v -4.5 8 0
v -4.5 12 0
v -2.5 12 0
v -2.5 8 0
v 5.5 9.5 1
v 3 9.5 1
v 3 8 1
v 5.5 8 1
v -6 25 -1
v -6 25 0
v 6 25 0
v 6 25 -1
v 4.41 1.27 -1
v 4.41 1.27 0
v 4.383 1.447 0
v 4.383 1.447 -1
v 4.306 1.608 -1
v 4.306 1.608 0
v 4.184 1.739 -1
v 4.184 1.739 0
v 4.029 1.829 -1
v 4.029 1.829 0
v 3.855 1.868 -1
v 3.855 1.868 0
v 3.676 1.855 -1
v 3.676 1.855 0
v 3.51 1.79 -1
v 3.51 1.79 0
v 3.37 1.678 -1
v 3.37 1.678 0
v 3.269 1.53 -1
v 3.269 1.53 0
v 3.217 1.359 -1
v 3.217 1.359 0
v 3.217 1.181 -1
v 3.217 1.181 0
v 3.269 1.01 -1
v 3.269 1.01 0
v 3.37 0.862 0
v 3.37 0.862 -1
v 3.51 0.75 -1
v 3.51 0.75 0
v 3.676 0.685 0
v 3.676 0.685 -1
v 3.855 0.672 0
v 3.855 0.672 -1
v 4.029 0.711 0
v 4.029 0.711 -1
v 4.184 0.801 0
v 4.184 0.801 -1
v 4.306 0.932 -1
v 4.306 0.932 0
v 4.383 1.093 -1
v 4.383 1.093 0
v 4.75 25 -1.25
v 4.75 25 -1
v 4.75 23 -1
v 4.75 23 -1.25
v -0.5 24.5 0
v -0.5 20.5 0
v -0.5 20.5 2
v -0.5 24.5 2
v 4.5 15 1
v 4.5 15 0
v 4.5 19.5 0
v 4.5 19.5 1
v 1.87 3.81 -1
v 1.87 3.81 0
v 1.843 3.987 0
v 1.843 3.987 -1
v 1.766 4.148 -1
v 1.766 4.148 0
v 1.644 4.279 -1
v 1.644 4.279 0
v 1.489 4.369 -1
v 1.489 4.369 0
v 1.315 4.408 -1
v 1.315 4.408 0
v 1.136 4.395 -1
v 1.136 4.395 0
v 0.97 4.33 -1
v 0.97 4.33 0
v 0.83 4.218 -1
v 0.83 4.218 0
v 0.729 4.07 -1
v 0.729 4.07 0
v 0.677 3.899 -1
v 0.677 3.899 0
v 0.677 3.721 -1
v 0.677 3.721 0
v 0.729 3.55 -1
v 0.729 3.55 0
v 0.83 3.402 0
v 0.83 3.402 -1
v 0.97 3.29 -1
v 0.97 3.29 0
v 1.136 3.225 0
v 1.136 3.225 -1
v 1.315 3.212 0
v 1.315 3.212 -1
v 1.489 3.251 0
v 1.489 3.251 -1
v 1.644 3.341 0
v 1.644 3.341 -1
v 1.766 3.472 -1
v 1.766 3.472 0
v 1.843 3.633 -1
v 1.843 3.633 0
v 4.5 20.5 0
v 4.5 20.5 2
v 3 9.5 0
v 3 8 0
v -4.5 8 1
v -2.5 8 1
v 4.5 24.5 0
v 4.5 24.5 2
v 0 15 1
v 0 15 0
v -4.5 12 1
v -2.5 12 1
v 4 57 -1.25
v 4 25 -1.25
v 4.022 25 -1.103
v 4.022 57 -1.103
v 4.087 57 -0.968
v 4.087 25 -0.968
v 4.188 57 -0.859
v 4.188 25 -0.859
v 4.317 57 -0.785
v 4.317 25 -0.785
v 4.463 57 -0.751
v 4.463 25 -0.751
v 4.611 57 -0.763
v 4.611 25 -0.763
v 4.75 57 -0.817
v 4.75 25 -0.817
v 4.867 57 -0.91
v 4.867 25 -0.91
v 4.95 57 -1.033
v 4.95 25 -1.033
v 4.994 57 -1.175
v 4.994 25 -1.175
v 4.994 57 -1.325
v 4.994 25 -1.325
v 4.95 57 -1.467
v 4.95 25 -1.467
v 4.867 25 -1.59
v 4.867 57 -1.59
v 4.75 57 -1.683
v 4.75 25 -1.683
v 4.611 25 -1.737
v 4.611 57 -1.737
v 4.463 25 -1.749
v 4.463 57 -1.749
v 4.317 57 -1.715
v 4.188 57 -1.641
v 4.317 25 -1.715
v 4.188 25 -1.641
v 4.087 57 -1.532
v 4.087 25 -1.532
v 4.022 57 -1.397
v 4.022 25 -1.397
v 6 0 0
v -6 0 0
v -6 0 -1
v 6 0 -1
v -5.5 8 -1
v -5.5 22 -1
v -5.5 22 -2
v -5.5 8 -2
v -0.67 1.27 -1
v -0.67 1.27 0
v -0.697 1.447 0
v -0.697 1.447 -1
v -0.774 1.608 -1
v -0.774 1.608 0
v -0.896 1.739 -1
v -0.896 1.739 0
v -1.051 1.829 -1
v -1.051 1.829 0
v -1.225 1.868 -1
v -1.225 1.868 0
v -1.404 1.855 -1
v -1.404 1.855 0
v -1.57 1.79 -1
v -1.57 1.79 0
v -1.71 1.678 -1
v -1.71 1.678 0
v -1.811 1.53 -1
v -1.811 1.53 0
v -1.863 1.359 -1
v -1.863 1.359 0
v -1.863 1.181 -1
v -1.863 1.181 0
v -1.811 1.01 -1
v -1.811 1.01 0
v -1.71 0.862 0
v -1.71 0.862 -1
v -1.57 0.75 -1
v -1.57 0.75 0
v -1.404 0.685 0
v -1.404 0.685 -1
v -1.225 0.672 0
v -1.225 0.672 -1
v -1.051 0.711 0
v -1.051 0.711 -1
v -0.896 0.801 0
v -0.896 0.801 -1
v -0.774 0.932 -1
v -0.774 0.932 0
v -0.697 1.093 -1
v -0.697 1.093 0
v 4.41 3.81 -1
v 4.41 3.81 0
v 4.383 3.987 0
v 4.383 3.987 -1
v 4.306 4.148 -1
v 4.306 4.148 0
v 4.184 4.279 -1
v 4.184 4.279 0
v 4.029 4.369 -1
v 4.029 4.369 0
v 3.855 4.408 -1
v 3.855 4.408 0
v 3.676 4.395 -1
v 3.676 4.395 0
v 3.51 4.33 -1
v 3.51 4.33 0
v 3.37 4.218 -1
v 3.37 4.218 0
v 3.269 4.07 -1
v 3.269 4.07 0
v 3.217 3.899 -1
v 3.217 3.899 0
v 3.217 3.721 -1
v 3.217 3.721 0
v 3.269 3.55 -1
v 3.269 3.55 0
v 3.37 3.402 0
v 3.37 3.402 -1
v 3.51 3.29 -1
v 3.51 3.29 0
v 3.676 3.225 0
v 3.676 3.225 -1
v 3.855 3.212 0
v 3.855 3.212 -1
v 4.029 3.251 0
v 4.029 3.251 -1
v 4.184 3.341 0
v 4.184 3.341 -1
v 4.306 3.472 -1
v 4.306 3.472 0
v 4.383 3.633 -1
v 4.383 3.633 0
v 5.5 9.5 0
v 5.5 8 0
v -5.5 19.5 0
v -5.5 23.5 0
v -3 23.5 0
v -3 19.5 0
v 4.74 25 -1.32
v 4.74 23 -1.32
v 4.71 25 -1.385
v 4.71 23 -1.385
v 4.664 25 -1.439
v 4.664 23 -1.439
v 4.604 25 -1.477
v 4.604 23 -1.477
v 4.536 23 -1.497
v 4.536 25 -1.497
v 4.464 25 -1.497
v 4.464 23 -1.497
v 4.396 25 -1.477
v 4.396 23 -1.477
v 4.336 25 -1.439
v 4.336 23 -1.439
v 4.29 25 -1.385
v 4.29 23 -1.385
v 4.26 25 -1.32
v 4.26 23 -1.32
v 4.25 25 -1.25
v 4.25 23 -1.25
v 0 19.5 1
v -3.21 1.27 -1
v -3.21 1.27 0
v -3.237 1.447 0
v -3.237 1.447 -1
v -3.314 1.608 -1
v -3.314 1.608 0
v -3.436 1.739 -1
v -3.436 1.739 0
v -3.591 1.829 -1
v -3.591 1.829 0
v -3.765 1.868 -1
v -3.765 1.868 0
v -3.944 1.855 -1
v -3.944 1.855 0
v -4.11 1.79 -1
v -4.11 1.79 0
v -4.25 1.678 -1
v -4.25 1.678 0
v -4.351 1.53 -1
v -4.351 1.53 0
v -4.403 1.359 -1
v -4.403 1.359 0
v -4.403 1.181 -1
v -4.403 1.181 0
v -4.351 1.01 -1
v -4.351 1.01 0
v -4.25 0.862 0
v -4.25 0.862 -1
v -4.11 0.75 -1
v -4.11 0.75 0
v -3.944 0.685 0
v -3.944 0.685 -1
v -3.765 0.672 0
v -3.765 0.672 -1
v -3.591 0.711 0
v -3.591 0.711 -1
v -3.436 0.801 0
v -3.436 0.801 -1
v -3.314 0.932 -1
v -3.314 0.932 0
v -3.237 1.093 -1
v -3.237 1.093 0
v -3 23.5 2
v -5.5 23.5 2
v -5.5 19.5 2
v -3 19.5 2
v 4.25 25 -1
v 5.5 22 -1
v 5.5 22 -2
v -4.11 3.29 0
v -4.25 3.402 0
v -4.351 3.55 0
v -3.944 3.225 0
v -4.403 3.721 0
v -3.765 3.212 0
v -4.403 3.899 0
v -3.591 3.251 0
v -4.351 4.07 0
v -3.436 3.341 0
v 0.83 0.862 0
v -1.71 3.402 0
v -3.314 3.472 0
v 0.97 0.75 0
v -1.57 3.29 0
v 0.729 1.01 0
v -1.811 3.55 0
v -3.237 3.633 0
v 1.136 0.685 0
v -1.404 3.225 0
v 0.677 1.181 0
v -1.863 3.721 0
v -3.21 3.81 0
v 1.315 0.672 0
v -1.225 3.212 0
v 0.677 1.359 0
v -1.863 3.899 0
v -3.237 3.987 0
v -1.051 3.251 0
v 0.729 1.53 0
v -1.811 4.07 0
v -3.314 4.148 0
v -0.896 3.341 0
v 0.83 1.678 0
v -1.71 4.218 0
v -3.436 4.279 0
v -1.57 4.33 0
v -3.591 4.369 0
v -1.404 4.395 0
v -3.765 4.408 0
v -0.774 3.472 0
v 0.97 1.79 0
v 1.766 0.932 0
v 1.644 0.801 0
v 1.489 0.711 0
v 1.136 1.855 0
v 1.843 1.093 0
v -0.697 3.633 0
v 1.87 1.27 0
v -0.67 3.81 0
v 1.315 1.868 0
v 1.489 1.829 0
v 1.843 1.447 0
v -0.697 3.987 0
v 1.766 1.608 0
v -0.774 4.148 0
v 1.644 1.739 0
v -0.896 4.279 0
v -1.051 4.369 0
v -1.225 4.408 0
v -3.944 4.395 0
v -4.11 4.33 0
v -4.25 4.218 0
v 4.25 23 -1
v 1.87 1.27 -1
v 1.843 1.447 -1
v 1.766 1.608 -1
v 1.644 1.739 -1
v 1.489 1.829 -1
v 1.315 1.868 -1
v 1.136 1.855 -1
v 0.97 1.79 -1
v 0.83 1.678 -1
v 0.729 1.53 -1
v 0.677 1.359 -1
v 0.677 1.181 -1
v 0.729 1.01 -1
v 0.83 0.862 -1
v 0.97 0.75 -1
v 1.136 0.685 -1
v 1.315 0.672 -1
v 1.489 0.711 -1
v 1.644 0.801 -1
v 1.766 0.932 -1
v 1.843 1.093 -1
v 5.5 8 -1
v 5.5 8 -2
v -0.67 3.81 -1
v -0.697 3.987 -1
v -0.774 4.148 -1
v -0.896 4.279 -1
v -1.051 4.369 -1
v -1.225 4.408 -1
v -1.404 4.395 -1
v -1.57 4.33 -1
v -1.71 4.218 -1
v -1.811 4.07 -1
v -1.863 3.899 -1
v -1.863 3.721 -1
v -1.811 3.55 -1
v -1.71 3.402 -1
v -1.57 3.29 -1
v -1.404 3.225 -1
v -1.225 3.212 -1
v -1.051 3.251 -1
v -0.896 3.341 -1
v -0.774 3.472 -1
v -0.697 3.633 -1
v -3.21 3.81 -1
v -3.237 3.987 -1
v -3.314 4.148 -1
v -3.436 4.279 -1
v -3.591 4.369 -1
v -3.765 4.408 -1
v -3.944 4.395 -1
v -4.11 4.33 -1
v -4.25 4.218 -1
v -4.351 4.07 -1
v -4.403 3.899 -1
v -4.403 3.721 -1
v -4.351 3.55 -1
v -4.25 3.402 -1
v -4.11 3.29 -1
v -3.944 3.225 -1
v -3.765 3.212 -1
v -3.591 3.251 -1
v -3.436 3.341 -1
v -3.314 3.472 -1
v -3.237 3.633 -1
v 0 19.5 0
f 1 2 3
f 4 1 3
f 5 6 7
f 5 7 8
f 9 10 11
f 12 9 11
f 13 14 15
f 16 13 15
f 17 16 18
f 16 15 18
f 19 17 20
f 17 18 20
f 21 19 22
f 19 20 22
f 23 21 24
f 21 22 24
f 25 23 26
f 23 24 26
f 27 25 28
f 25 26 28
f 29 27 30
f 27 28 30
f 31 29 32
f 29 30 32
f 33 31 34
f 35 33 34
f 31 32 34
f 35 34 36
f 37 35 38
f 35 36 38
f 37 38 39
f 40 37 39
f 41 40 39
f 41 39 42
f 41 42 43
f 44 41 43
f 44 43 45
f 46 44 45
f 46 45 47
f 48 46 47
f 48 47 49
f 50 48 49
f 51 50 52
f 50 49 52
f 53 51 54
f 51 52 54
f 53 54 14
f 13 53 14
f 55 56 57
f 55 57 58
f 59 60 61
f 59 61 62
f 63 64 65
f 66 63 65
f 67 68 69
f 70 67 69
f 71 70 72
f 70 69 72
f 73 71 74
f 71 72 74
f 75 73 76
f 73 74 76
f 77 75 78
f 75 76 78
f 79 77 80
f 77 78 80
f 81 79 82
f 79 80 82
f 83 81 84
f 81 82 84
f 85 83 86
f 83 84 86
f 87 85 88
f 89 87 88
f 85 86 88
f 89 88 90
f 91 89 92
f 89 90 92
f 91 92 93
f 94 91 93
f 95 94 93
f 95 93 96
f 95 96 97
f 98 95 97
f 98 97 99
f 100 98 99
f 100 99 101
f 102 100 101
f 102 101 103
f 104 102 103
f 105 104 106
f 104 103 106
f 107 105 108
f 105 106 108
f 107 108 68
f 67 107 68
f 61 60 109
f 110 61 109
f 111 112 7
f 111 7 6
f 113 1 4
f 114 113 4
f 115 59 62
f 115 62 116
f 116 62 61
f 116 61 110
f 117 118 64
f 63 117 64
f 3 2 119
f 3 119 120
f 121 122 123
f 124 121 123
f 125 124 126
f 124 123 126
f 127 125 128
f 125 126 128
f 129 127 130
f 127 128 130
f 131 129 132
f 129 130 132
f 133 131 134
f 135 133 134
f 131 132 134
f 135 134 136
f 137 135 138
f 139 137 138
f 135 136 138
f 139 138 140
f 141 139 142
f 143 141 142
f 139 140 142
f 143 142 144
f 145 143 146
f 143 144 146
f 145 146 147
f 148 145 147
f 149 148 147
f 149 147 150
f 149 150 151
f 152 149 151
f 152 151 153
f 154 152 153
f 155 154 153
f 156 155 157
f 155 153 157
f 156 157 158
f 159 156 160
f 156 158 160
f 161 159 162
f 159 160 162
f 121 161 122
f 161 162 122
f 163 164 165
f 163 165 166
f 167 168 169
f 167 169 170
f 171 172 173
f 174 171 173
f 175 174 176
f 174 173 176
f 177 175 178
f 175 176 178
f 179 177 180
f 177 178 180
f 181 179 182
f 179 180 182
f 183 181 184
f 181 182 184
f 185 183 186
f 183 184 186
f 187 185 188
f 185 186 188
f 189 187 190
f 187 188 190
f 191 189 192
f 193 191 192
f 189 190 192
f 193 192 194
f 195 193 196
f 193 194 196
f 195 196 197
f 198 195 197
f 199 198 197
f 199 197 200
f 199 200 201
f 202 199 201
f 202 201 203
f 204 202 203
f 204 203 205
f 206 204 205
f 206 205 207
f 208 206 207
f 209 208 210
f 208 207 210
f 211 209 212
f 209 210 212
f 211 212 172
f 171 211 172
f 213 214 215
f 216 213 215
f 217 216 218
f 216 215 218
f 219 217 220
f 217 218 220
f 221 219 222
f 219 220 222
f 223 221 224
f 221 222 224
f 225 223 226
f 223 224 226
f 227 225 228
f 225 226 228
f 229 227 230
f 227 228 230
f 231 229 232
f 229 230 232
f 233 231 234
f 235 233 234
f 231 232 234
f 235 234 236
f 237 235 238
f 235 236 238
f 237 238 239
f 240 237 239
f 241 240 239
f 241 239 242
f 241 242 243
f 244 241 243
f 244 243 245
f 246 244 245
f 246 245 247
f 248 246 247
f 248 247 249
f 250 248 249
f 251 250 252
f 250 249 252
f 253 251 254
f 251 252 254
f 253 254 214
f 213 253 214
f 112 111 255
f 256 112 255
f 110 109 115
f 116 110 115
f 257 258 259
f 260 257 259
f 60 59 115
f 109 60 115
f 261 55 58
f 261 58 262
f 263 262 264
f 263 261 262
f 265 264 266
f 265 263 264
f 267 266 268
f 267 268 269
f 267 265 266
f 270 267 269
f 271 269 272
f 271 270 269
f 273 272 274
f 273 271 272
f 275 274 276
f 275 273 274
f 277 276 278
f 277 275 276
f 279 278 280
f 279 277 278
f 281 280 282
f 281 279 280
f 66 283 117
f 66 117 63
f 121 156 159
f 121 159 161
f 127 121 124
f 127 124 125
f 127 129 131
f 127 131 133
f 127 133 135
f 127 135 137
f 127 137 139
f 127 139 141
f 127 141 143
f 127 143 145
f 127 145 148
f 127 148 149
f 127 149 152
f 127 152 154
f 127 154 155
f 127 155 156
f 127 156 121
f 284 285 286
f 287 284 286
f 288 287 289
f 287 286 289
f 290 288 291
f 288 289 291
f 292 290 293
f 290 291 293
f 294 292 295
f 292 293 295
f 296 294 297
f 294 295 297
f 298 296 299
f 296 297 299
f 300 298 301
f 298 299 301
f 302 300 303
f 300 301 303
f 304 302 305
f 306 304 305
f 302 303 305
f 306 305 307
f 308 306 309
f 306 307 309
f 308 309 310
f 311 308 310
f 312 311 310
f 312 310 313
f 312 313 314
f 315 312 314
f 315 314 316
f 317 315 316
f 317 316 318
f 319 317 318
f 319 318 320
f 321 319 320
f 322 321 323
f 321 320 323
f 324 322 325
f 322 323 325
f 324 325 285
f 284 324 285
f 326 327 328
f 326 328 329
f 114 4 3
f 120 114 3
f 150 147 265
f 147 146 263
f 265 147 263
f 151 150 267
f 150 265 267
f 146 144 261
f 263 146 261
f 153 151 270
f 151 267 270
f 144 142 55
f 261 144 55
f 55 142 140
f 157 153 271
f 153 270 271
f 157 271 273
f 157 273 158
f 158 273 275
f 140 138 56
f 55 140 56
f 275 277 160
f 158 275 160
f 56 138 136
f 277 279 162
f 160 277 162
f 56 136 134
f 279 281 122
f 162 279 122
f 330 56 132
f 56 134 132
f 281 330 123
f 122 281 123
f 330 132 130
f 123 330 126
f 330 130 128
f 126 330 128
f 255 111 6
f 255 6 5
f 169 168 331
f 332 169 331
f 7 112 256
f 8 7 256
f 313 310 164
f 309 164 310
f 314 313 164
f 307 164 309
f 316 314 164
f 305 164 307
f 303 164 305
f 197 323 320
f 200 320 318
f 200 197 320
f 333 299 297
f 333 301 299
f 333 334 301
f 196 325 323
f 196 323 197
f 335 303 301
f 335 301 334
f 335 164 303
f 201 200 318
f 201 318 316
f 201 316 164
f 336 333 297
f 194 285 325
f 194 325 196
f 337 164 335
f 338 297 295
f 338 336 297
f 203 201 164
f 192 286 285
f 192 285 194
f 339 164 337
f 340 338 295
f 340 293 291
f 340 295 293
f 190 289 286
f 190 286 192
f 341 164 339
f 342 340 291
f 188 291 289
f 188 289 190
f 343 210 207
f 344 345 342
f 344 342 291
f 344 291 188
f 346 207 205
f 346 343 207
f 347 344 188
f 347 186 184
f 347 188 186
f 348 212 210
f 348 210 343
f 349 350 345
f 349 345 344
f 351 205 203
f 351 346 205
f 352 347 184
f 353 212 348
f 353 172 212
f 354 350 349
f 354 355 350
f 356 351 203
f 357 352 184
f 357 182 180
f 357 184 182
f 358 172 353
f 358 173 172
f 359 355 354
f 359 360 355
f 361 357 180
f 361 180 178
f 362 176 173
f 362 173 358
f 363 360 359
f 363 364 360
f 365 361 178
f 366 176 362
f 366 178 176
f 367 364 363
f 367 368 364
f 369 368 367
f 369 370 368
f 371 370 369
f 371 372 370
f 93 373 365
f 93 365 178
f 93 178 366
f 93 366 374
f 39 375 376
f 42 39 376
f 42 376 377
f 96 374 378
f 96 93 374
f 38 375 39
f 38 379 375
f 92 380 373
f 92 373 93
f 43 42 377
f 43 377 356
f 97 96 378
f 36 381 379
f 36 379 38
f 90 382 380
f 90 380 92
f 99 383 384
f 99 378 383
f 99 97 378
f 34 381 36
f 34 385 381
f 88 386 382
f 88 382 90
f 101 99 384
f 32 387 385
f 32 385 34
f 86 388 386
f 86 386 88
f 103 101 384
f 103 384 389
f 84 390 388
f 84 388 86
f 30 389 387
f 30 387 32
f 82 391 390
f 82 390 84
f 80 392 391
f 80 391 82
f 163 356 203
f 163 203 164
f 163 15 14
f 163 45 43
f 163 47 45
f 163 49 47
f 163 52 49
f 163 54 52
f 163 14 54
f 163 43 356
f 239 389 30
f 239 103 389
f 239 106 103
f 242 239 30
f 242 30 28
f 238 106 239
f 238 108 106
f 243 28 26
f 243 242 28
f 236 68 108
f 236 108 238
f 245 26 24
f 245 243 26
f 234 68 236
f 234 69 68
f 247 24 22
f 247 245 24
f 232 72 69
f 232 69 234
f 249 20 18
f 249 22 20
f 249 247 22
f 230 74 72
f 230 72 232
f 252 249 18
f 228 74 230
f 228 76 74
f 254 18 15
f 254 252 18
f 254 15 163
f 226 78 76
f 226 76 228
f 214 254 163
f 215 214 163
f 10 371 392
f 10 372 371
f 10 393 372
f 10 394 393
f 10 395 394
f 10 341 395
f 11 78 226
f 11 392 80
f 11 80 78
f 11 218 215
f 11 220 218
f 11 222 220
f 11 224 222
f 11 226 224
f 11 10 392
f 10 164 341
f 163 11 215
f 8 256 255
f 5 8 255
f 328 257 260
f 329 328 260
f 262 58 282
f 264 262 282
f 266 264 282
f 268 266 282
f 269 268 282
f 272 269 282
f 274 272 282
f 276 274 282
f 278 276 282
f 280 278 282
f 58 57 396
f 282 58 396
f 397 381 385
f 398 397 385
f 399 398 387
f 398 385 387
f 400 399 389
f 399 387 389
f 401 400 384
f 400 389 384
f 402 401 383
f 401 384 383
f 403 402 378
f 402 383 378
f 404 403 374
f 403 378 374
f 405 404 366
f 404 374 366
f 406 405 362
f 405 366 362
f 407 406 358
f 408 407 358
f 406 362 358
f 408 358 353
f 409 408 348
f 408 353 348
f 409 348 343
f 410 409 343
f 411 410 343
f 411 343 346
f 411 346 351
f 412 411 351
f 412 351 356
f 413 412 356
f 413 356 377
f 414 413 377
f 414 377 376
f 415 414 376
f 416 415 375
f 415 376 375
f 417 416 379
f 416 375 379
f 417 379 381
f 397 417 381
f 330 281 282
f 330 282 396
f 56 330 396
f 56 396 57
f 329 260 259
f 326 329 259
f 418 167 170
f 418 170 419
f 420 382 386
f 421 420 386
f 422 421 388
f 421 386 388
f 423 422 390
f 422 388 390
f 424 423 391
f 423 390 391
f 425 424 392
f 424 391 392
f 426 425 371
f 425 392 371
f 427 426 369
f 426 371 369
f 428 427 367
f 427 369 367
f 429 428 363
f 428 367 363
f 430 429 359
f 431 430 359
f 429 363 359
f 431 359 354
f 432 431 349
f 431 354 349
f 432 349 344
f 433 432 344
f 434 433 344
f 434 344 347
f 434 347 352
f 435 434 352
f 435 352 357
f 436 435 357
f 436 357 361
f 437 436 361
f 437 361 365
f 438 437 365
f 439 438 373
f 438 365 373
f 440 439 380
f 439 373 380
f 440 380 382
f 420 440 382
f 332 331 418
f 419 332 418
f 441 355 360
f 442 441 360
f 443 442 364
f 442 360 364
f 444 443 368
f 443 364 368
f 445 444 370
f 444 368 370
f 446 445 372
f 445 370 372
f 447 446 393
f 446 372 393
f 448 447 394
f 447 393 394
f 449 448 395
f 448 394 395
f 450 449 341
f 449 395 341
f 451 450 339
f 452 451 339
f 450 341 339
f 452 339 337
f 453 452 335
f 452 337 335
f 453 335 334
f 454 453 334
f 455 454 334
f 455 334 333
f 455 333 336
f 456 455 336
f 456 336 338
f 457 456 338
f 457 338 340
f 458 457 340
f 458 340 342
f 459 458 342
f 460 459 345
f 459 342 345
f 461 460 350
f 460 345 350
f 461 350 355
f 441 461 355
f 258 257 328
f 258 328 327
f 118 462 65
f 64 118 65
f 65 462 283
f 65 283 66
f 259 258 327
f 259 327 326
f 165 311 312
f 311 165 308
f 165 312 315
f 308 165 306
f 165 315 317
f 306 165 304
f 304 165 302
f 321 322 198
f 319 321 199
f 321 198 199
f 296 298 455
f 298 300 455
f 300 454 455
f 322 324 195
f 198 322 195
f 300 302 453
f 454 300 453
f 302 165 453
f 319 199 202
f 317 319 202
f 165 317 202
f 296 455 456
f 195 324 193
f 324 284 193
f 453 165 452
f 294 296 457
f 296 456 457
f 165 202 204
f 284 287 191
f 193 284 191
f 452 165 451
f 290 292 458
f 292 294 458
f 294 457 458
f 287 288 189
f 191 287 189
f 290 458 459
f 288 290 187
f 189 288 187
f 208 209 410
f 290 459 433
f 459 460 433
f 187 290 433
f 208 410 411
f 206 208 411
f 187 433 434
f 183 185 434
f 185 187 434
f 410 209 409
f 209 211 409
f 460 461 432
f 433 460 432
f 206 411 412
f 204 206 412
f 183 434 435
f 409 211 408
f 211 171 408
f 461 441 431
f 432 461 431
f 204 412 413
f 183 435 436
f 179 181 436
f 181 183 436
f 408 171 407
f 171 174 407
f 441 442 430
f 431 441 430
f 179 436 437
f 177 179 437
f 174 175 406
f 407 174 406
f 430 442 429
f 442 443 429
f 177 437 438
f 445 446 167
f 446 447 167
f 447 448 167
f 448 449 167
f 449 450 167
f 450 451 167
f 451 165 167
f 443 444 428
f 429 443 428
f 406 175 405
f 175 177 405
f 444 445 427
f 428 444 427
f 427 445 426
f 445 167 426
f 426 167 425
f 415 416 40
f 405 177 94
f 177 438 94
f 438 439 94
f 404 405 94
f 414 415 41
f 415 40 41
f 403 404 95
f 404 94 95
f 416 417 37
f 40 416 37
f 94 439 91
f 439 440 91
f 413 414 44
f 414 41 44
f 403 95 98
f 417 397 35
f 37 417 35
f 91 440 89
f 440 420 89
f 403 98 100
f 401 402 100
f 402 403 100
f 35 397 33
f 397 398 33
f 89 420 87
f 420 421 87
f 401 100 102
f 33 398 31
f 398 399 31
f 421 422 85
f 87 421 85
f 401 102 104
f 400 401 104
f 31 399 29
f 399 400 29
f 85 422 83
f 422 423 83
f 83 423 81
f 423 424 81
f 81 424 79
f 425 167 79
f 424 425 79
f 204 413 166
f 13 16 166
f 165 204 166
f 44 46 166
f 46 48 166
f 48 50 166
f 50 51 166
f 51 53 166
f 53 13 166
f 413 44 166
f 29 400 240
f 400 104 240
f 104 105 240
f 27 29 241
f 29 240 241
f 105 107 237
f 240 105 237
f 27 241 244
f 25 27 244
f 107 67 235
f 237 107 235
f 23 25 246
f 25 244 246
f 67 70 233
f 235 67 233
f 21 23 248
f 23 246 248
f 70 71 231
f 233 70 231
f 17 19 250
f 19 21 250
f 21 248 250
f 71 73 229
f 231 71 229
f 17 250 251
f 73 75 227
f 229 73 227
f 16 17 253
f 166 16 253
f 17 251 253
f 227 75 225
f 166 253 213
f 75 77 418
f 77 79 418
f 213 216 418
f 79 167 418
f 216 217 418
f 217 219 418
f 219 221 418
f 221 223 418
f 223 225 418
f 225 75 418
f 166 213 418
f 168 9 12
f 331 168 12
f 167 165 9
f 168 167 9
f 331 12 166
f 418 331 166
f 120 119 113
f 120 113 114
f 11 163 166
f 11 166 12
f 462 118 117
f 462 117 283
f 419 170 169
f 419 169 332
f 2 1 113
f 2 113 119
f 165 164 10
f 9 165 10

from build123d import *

# Parameters (mm, degrees)
F0_W     = 12
F0_H     = 25
F0_R     = 0.6
F2_DEPTH = 1
F1_W     = 4.5
F1_H     = 4.5
F3_DEPTH = 1
F1_W_2   = 2
F1_H_2   = 4
F1_W_3   = 2.5
F1_H_3   = 1.5
F1_W_4   = 5
F4_DEPTH = 2
F5_W     = 11
F5_H     = 14
F6_DEPTH = 1
F7_R     = 0.5
F8_DEPTH = 32
F9_DEPTH = 2


with BuildPart() as f2:
    # F0 (on Top) → F2 (new body)
    with BuildSketch(Plane.XY):
        with Locations((0, 12.5)):
            Rectangle(F0_W, F0_H)
        with Locations((-3.81, 1.27)):
            Circle(F0_R, mode=Mode.SUBTRACT)
        with Locations((-3.81, 3.81)):
            Circle(F0_R, mode=Mode.SUBTRACT)
        with Locations((-1.27, 1.27)):
            Circle(F0_R, mode=Mode.SUBTRACT)
        with Locations((-1.27, 3.81)):
            Circle(F0_R, mode=Mode.SUBTRACT)
        with Locations((1.27, 1.27)):
            Circle(F0_R, mode=Mode.SUBTRACT)
        with Locations((1.27, 3.81)):
            Circle(F0_R, mode=Mode.SUBTRACT)
        with Locations((3.81, 1.27)):
            Circle(F0_R, mode=Mode.SUBTRACT)
        with Locations((3.81, 3.81)):
            Circle(F0_R, mode=Mode.SUBTRACT)
    extrude(amount=-F2_DEPTH)

    # F5 (on face) → F6 (join)
    with BuildSketch(Plane(origin=(0, 0, -1), x_dir=(1, 0, 0), z_dir=(0, 0, -1))):
        with Locations((0, -15)):
            Rectangle(F5_W, F5_H)
    extrude(amount=F6_DEPTH)


with BuildPart() as f3:
    # F1 (on Top) → F3 (new body)
    with BuildSketch(Plane.XY):
        with Locations((2.25, 17.25)):
            Rectangle(F1_W, F1_H)
    extrude(amount=F3_DEPTH)


with BuildPart() as f3b:
    # F1 (on Top) → F3, piece 2 (new body)
    with BuildSketch(Plane.XY):
        with Locations((-3.5, 10)):
            Rectangle(F1_W_2, F1_H_2)
    extrude(amount=F3_DEPTH)


with BuildPart() as f3c:
    # F1 (on Top) → F3, piece 3 (new body)
    with BuildSketch(Plane.XY):
        with Locations((4.25, 8.75)):
            Rectangle(F1_W_3, F1_H_3)
    extrude(amount=F3_DEPTH)


with BuildPart() as f4:
    # F1 (on Top) → F4 (new body)
    with BuildSketch(Plane.XY):
        with Locations((2, 22.5)):
            Rectangle(F1_W_4, F1_H_2)
    extrude(amount=F4_DEPTH)


with BuildPart() as f4b:
    # F1 (on Top) → F4, piece 2 (new body)
    with BuildSketch(Plane.XY):
        with Locations((-4.25, 21.5)):
            Rectangle(F1_W_3, F1_H_2)
    extrude(amount=F4_DEPTH)


with BuildPart() as f8:
    # F7 (on face) → F8 (new body)
    with BuildSketch(Plane(origin=(0, 25, 0), x_dir=(-1, 0, 0), z_dir=(0, 1, 0))):
        with Locations((-4.5, -1.25)):
            Circle(F7_R)
        with BuildLine():
            Line((-4.75, -1), (-4.75, -1.25))
            ThreePointArc((-4.75, -1.25), (-4.5, -1.5), (-4.25, -1.25))
            Line((-4.25, -1.25), (-4.25, -1))
            Line((-4.25, -1), (-4.75, -1))
        make_face()
    extrude(amount=F8_DEPTH)

    # F7 (on face) → F9 (join)
    with BuildSketch(Plane(origin=(0, 25, 0), x_dir=(-1, 0, 0), z_dir=(0, 1, 0))):
        with BuildLine():
            Line((-4.75, -1), (-4.75, -1.25))
            ThreePointArc((-4.75, -1.25), (-4.5, -1.5), (-4.25, -1.25))
            Line((-4.25, -1.25), (-4.25, -1))
            Line((-4.25, -1), (-4.75, -1))
        make_face()
    extrude(amount=-F9_DEPTH)


solid = Compound([f2.part, f3.part, f3b.part, f3c.part, f4.part, f4b.part, f8.part])
